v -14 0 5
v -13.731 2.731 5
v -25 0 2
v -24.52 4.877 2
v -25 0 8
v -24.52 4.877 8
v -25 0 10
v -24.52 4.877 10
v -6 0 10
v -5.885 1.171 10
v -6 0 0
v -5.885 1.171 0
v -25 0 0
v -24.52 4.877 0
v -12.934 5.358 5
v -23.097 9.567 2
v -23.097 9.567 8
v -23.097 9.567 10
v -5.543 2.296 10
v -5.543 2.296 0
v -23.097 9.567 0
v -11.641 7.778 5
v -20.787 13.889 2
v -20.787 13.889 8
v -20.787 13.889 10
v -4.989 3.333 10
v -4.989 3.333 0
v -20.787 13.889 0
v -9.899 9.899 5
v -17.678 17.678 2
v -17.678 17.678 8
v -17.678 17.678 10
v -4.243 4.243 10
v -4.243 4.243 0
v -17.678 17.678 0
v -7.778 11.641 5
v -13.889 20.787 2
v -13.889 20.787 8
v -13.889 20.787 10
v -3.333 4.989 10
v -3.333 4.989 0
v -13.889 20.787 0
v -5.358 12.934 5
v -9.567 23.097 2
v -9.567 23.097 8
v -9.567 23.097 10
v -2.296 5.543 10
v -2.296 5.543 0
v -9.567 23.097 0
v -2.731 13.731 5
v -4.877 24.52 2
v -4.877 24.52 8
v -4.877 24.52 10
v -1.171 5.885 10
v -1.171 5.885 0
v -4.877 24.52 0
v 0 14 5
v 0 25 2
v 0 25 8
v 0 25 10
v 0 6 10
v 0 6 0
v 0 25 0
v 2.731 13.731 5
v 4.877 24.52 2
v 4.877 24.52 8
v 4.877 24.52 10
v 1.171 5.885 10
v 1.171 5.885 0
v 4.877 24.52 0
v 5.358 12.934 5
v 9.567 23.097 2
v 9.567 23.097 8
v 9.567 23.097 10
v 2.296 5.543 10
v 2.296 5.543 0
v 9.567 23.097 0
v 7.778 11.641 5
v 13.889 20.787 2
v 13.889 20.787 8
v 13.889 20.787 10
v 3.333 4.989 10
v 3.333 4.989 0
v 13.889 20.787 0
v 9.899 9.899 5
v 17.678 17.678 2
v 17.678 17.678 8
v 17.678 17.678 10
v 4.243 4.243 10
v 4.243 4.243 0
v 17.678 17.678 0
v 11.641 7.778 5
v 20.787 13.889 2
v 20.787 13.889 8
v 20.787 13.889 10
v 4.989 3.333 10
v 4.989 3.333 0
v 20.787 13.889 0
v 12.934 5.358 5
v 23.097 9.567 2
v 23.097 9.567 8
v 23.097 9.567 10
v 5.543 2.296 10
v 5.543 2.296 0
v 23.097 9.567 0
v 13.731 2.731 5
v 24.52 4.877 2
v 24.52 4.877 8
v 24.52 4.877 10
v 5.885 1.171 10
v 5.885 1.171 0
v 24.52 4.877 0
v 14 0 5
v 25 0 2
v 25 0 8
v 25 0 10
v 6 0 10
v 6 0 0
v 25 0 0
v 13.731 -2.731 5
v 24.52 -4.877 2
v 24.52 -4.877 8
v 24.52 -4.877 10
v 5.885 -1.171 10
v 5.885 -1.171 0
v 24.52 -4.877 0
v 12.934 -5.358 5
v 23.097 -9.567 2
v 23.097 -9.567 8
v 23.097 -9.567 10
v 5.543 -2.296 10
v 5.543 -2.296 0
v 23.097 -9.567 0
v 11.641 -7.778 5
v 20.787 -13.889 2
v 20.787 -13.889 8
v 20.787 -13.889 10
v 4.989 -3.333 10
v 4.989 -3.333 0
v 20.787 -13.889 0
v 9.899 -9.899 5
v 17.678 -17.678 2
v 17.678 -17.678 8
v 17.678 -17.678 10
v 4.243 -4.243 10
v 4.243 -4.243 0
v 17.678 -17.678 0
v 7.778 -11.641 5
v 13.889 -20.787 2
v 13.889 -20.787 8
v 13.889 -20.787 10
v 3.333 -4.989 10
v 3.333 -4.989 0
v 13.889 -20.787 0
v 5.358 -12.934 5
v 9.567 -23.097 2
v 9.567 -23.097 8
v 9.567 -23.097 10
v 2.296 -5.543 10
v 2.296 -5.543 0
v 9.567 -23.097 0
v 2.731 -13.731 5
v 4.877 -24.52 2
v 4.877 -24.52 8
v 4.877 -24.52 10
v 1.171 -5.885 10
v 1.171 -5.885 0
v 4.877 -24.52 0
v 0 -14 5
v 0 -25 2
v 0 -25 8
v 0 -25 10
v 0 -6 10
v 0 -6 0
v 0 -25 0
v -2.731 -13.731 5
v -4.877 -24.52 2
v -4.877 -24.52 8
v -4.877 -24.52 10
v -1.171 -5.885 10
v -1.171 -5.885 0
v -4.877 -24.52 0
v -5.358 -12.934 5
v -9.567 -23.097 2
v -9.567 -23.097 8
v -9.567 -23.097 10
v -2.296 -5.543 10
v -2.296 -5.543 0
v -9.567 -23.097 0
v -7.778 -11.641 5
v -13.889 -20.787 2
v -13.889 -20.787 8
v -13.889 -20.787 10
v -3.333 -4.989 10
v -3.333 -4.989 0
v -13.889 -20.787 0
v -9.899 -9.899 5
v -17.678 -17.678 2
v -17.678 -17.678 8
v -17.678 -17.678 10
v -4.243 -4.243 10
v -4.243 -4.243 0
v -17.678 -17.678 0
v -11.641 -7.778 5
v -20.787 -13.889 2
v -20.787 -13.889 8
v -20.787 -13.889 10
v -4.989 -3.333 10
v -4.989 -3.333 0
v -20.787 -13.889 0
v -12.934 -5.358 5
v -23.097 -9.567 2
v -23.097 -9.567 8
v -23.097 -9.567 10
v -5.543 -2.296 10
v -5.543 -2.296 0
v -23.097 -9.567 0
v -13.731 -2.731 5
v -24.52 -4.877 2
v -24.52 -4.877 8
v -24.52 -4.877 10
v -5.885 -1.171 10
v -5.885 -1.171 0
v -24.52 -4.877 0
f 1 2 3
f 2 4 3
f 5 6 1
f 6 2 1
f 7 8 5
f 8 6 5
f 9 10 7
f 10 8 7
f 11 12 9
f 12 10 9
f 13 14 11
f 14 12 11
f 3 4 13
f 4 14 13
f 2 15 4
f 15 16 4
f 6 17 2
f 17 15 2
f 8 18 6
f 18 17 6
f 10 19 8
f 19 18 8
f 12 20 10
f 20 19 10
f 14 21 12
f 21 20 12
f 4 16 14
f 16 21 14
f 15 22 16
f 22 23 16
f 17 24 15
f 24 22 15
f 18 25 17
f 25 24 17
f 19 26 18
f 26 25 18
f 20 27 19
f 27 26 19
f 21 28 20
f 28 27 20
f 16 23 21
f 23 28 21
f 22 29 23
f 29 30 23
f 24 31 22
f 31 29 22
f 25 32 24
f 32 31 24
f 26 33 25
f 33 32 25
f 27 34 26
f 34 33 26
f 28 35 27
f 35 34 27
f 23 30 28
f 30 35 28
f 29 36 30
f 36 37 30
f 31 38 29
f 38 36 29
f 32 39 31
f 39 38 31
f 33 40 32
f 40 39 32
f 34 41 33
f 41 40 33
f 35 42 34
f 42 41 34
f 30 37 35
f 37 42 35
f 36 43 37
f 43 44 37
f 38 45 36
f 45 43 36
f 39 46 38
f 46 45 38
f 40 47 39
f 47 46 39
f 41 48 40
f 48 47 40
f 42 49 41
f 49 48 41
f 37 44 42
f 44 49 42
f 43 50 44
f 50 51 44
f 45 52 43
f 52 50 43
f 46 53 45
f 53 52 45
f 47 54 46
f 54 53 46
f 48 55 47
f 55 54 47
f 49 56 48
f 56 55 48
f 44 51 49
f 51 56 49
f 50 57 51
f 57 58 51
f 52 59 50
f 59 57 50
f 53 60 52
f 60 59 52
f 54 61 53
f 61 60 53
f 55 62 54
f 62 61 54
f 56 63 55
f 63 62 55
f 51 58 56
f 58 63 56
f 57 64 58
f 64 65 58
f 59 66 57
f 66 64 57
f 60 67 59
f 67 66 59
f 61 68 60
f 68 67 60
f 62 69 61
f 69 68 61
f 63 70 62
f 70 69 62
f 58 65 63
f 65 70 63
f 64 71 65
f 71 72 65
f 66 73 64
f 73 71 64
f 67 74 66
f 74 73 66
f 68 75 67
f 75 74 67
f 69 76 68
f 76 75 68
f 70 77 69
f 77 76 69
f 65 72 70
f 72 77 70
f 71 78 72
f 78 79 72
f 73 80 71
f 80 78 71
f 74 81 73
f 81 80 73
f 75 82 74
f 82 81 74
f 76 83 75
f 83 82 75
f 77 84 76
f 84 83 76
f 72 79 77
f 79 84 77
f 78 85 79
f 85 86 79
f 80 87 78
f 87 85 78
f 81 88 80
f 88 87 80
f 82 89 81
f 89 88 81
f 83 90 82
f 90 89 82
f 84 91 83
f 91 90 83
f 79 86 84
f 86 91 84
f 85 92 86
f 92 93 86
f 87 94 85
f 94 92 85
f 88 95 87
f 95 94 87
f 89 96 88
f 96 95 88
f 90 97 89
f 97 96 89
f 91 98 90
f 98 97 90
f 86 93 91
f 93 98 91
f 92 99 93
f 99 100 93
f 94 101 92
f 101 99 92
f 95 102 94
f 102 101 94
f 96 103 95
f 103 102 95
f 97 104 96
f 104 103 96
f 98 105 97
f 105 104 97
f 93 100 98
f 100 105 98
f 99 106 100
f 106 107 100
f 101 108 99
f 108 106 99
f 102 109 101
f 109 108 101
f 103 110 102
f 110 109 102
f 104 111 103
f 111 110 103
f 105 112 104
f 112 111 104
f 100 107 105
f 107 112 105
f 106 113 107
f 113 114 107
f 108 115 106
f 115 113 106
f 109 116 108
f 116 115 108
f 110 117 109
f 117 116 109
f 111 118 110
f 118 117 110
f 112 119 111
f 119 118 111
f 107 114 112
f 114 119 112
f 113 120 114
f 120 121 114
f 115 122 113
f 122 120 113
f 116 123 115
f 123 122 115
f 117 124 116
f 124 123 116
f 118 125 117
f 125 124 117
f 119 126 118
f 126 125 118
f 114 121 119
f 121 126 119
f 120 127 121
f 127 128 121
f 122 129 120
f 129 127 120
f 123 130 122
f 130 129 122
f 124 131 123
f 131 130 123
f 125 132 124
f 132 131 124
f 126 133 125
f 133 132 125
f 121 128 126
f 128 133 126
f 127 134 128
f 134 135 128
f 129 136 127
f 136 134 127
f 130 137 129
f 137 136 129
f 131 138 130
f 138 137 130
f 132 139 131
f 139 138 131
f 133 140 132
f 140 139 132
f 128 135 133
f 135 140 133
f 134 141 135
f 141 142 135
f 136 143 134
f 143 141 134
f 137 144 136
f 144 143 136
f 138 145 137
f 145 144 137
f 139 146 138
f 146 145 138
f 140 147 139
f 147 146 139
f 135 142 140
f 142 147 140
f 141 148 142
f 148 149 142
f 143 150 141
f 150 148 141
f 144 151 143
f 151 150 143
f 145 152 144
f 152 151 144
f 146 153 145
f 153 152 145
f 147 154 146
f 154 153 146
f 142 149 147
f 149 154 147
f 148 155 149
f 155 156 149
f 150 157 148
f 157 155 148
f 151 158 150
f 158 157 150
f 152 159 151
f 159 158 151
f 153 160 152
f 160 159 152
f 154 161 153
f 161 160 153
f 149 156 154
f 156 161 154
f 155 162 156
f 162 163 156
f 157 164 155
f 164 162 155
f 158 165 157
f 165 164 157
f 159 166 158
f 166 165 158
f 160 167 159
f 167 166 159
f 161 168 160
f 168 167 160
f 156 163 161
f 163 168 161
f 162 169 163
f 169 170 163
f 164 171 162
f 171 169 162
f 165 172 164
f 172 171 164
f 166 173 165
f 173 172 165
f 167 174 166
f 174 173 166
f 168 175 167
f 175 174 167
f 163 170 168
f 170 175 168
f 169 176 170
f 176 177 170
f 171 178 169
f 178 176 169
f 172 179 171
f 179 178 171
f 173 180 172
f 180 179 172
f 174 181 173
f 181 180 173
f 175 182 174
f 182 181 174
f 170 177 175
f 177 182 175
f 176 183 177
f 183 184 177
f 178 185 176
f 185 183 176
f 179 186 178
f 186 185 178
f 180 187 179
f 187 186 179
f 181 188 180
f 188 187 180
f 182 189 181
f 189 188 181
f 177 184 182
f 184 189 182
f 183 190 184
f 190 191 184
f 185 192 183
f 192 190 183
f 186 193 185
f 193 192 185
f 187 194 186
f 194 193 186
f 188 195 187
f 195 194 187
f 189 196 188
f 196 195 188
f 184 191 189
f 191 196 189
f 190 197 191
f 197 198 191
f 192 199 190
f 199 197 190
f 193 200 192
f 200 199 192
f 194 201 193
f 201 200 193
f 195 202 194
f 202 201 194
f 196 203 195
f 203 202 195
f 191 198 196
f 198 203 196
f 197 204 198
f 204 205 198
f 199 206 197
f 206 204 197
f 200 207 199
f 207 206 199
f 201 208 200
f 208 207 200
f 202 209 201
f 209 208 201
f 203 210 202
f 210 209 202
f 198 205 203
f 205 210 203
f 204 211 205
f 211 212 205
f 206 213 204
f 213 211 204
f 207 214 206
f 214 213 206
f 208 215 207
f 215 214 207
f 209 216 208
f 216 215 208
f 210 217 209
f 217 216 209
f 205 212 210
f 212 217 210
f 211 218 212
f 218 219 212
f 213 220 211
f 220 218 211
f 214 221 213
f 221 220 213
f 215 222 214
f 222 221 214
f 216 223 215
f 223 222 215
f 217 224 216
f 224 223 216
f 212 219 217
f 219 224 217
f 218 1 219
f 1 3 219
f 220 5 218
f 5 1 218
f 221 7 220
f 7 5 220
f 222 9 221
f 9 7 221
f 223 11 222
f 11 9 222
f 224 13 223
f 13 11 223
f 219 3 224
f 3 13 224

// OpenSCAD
$fn = 32;

// ----------------------------------------------------------------------
// Revolved part: V-groove pulley R25
// ----------------------------------------------------------------------

// --- parameters (mm) ---
bore_r = 6;               // bore radius
rim_r = 25;               // rim radius
rim_t = 10;               // rim width
groove_r = 14;            // groove root radius
groove_w = 3;             // groove half width
revolve_angle = 360;      // revolve sweep, degrees

bore_d = 2 * bore_r;
rim_d = 2 * rim_r;
groove_d = 2 * groove_r;

profile = [[6, 0], [25, 0], [25, 2], [14, 5], [25, 8], [25, 10], [6, 10]];  // primary outline, 7 points, counter clockwise

// --- the one profile operation ---
rotate_extrude(angle = revolve_angle) polygon(points = profile);
